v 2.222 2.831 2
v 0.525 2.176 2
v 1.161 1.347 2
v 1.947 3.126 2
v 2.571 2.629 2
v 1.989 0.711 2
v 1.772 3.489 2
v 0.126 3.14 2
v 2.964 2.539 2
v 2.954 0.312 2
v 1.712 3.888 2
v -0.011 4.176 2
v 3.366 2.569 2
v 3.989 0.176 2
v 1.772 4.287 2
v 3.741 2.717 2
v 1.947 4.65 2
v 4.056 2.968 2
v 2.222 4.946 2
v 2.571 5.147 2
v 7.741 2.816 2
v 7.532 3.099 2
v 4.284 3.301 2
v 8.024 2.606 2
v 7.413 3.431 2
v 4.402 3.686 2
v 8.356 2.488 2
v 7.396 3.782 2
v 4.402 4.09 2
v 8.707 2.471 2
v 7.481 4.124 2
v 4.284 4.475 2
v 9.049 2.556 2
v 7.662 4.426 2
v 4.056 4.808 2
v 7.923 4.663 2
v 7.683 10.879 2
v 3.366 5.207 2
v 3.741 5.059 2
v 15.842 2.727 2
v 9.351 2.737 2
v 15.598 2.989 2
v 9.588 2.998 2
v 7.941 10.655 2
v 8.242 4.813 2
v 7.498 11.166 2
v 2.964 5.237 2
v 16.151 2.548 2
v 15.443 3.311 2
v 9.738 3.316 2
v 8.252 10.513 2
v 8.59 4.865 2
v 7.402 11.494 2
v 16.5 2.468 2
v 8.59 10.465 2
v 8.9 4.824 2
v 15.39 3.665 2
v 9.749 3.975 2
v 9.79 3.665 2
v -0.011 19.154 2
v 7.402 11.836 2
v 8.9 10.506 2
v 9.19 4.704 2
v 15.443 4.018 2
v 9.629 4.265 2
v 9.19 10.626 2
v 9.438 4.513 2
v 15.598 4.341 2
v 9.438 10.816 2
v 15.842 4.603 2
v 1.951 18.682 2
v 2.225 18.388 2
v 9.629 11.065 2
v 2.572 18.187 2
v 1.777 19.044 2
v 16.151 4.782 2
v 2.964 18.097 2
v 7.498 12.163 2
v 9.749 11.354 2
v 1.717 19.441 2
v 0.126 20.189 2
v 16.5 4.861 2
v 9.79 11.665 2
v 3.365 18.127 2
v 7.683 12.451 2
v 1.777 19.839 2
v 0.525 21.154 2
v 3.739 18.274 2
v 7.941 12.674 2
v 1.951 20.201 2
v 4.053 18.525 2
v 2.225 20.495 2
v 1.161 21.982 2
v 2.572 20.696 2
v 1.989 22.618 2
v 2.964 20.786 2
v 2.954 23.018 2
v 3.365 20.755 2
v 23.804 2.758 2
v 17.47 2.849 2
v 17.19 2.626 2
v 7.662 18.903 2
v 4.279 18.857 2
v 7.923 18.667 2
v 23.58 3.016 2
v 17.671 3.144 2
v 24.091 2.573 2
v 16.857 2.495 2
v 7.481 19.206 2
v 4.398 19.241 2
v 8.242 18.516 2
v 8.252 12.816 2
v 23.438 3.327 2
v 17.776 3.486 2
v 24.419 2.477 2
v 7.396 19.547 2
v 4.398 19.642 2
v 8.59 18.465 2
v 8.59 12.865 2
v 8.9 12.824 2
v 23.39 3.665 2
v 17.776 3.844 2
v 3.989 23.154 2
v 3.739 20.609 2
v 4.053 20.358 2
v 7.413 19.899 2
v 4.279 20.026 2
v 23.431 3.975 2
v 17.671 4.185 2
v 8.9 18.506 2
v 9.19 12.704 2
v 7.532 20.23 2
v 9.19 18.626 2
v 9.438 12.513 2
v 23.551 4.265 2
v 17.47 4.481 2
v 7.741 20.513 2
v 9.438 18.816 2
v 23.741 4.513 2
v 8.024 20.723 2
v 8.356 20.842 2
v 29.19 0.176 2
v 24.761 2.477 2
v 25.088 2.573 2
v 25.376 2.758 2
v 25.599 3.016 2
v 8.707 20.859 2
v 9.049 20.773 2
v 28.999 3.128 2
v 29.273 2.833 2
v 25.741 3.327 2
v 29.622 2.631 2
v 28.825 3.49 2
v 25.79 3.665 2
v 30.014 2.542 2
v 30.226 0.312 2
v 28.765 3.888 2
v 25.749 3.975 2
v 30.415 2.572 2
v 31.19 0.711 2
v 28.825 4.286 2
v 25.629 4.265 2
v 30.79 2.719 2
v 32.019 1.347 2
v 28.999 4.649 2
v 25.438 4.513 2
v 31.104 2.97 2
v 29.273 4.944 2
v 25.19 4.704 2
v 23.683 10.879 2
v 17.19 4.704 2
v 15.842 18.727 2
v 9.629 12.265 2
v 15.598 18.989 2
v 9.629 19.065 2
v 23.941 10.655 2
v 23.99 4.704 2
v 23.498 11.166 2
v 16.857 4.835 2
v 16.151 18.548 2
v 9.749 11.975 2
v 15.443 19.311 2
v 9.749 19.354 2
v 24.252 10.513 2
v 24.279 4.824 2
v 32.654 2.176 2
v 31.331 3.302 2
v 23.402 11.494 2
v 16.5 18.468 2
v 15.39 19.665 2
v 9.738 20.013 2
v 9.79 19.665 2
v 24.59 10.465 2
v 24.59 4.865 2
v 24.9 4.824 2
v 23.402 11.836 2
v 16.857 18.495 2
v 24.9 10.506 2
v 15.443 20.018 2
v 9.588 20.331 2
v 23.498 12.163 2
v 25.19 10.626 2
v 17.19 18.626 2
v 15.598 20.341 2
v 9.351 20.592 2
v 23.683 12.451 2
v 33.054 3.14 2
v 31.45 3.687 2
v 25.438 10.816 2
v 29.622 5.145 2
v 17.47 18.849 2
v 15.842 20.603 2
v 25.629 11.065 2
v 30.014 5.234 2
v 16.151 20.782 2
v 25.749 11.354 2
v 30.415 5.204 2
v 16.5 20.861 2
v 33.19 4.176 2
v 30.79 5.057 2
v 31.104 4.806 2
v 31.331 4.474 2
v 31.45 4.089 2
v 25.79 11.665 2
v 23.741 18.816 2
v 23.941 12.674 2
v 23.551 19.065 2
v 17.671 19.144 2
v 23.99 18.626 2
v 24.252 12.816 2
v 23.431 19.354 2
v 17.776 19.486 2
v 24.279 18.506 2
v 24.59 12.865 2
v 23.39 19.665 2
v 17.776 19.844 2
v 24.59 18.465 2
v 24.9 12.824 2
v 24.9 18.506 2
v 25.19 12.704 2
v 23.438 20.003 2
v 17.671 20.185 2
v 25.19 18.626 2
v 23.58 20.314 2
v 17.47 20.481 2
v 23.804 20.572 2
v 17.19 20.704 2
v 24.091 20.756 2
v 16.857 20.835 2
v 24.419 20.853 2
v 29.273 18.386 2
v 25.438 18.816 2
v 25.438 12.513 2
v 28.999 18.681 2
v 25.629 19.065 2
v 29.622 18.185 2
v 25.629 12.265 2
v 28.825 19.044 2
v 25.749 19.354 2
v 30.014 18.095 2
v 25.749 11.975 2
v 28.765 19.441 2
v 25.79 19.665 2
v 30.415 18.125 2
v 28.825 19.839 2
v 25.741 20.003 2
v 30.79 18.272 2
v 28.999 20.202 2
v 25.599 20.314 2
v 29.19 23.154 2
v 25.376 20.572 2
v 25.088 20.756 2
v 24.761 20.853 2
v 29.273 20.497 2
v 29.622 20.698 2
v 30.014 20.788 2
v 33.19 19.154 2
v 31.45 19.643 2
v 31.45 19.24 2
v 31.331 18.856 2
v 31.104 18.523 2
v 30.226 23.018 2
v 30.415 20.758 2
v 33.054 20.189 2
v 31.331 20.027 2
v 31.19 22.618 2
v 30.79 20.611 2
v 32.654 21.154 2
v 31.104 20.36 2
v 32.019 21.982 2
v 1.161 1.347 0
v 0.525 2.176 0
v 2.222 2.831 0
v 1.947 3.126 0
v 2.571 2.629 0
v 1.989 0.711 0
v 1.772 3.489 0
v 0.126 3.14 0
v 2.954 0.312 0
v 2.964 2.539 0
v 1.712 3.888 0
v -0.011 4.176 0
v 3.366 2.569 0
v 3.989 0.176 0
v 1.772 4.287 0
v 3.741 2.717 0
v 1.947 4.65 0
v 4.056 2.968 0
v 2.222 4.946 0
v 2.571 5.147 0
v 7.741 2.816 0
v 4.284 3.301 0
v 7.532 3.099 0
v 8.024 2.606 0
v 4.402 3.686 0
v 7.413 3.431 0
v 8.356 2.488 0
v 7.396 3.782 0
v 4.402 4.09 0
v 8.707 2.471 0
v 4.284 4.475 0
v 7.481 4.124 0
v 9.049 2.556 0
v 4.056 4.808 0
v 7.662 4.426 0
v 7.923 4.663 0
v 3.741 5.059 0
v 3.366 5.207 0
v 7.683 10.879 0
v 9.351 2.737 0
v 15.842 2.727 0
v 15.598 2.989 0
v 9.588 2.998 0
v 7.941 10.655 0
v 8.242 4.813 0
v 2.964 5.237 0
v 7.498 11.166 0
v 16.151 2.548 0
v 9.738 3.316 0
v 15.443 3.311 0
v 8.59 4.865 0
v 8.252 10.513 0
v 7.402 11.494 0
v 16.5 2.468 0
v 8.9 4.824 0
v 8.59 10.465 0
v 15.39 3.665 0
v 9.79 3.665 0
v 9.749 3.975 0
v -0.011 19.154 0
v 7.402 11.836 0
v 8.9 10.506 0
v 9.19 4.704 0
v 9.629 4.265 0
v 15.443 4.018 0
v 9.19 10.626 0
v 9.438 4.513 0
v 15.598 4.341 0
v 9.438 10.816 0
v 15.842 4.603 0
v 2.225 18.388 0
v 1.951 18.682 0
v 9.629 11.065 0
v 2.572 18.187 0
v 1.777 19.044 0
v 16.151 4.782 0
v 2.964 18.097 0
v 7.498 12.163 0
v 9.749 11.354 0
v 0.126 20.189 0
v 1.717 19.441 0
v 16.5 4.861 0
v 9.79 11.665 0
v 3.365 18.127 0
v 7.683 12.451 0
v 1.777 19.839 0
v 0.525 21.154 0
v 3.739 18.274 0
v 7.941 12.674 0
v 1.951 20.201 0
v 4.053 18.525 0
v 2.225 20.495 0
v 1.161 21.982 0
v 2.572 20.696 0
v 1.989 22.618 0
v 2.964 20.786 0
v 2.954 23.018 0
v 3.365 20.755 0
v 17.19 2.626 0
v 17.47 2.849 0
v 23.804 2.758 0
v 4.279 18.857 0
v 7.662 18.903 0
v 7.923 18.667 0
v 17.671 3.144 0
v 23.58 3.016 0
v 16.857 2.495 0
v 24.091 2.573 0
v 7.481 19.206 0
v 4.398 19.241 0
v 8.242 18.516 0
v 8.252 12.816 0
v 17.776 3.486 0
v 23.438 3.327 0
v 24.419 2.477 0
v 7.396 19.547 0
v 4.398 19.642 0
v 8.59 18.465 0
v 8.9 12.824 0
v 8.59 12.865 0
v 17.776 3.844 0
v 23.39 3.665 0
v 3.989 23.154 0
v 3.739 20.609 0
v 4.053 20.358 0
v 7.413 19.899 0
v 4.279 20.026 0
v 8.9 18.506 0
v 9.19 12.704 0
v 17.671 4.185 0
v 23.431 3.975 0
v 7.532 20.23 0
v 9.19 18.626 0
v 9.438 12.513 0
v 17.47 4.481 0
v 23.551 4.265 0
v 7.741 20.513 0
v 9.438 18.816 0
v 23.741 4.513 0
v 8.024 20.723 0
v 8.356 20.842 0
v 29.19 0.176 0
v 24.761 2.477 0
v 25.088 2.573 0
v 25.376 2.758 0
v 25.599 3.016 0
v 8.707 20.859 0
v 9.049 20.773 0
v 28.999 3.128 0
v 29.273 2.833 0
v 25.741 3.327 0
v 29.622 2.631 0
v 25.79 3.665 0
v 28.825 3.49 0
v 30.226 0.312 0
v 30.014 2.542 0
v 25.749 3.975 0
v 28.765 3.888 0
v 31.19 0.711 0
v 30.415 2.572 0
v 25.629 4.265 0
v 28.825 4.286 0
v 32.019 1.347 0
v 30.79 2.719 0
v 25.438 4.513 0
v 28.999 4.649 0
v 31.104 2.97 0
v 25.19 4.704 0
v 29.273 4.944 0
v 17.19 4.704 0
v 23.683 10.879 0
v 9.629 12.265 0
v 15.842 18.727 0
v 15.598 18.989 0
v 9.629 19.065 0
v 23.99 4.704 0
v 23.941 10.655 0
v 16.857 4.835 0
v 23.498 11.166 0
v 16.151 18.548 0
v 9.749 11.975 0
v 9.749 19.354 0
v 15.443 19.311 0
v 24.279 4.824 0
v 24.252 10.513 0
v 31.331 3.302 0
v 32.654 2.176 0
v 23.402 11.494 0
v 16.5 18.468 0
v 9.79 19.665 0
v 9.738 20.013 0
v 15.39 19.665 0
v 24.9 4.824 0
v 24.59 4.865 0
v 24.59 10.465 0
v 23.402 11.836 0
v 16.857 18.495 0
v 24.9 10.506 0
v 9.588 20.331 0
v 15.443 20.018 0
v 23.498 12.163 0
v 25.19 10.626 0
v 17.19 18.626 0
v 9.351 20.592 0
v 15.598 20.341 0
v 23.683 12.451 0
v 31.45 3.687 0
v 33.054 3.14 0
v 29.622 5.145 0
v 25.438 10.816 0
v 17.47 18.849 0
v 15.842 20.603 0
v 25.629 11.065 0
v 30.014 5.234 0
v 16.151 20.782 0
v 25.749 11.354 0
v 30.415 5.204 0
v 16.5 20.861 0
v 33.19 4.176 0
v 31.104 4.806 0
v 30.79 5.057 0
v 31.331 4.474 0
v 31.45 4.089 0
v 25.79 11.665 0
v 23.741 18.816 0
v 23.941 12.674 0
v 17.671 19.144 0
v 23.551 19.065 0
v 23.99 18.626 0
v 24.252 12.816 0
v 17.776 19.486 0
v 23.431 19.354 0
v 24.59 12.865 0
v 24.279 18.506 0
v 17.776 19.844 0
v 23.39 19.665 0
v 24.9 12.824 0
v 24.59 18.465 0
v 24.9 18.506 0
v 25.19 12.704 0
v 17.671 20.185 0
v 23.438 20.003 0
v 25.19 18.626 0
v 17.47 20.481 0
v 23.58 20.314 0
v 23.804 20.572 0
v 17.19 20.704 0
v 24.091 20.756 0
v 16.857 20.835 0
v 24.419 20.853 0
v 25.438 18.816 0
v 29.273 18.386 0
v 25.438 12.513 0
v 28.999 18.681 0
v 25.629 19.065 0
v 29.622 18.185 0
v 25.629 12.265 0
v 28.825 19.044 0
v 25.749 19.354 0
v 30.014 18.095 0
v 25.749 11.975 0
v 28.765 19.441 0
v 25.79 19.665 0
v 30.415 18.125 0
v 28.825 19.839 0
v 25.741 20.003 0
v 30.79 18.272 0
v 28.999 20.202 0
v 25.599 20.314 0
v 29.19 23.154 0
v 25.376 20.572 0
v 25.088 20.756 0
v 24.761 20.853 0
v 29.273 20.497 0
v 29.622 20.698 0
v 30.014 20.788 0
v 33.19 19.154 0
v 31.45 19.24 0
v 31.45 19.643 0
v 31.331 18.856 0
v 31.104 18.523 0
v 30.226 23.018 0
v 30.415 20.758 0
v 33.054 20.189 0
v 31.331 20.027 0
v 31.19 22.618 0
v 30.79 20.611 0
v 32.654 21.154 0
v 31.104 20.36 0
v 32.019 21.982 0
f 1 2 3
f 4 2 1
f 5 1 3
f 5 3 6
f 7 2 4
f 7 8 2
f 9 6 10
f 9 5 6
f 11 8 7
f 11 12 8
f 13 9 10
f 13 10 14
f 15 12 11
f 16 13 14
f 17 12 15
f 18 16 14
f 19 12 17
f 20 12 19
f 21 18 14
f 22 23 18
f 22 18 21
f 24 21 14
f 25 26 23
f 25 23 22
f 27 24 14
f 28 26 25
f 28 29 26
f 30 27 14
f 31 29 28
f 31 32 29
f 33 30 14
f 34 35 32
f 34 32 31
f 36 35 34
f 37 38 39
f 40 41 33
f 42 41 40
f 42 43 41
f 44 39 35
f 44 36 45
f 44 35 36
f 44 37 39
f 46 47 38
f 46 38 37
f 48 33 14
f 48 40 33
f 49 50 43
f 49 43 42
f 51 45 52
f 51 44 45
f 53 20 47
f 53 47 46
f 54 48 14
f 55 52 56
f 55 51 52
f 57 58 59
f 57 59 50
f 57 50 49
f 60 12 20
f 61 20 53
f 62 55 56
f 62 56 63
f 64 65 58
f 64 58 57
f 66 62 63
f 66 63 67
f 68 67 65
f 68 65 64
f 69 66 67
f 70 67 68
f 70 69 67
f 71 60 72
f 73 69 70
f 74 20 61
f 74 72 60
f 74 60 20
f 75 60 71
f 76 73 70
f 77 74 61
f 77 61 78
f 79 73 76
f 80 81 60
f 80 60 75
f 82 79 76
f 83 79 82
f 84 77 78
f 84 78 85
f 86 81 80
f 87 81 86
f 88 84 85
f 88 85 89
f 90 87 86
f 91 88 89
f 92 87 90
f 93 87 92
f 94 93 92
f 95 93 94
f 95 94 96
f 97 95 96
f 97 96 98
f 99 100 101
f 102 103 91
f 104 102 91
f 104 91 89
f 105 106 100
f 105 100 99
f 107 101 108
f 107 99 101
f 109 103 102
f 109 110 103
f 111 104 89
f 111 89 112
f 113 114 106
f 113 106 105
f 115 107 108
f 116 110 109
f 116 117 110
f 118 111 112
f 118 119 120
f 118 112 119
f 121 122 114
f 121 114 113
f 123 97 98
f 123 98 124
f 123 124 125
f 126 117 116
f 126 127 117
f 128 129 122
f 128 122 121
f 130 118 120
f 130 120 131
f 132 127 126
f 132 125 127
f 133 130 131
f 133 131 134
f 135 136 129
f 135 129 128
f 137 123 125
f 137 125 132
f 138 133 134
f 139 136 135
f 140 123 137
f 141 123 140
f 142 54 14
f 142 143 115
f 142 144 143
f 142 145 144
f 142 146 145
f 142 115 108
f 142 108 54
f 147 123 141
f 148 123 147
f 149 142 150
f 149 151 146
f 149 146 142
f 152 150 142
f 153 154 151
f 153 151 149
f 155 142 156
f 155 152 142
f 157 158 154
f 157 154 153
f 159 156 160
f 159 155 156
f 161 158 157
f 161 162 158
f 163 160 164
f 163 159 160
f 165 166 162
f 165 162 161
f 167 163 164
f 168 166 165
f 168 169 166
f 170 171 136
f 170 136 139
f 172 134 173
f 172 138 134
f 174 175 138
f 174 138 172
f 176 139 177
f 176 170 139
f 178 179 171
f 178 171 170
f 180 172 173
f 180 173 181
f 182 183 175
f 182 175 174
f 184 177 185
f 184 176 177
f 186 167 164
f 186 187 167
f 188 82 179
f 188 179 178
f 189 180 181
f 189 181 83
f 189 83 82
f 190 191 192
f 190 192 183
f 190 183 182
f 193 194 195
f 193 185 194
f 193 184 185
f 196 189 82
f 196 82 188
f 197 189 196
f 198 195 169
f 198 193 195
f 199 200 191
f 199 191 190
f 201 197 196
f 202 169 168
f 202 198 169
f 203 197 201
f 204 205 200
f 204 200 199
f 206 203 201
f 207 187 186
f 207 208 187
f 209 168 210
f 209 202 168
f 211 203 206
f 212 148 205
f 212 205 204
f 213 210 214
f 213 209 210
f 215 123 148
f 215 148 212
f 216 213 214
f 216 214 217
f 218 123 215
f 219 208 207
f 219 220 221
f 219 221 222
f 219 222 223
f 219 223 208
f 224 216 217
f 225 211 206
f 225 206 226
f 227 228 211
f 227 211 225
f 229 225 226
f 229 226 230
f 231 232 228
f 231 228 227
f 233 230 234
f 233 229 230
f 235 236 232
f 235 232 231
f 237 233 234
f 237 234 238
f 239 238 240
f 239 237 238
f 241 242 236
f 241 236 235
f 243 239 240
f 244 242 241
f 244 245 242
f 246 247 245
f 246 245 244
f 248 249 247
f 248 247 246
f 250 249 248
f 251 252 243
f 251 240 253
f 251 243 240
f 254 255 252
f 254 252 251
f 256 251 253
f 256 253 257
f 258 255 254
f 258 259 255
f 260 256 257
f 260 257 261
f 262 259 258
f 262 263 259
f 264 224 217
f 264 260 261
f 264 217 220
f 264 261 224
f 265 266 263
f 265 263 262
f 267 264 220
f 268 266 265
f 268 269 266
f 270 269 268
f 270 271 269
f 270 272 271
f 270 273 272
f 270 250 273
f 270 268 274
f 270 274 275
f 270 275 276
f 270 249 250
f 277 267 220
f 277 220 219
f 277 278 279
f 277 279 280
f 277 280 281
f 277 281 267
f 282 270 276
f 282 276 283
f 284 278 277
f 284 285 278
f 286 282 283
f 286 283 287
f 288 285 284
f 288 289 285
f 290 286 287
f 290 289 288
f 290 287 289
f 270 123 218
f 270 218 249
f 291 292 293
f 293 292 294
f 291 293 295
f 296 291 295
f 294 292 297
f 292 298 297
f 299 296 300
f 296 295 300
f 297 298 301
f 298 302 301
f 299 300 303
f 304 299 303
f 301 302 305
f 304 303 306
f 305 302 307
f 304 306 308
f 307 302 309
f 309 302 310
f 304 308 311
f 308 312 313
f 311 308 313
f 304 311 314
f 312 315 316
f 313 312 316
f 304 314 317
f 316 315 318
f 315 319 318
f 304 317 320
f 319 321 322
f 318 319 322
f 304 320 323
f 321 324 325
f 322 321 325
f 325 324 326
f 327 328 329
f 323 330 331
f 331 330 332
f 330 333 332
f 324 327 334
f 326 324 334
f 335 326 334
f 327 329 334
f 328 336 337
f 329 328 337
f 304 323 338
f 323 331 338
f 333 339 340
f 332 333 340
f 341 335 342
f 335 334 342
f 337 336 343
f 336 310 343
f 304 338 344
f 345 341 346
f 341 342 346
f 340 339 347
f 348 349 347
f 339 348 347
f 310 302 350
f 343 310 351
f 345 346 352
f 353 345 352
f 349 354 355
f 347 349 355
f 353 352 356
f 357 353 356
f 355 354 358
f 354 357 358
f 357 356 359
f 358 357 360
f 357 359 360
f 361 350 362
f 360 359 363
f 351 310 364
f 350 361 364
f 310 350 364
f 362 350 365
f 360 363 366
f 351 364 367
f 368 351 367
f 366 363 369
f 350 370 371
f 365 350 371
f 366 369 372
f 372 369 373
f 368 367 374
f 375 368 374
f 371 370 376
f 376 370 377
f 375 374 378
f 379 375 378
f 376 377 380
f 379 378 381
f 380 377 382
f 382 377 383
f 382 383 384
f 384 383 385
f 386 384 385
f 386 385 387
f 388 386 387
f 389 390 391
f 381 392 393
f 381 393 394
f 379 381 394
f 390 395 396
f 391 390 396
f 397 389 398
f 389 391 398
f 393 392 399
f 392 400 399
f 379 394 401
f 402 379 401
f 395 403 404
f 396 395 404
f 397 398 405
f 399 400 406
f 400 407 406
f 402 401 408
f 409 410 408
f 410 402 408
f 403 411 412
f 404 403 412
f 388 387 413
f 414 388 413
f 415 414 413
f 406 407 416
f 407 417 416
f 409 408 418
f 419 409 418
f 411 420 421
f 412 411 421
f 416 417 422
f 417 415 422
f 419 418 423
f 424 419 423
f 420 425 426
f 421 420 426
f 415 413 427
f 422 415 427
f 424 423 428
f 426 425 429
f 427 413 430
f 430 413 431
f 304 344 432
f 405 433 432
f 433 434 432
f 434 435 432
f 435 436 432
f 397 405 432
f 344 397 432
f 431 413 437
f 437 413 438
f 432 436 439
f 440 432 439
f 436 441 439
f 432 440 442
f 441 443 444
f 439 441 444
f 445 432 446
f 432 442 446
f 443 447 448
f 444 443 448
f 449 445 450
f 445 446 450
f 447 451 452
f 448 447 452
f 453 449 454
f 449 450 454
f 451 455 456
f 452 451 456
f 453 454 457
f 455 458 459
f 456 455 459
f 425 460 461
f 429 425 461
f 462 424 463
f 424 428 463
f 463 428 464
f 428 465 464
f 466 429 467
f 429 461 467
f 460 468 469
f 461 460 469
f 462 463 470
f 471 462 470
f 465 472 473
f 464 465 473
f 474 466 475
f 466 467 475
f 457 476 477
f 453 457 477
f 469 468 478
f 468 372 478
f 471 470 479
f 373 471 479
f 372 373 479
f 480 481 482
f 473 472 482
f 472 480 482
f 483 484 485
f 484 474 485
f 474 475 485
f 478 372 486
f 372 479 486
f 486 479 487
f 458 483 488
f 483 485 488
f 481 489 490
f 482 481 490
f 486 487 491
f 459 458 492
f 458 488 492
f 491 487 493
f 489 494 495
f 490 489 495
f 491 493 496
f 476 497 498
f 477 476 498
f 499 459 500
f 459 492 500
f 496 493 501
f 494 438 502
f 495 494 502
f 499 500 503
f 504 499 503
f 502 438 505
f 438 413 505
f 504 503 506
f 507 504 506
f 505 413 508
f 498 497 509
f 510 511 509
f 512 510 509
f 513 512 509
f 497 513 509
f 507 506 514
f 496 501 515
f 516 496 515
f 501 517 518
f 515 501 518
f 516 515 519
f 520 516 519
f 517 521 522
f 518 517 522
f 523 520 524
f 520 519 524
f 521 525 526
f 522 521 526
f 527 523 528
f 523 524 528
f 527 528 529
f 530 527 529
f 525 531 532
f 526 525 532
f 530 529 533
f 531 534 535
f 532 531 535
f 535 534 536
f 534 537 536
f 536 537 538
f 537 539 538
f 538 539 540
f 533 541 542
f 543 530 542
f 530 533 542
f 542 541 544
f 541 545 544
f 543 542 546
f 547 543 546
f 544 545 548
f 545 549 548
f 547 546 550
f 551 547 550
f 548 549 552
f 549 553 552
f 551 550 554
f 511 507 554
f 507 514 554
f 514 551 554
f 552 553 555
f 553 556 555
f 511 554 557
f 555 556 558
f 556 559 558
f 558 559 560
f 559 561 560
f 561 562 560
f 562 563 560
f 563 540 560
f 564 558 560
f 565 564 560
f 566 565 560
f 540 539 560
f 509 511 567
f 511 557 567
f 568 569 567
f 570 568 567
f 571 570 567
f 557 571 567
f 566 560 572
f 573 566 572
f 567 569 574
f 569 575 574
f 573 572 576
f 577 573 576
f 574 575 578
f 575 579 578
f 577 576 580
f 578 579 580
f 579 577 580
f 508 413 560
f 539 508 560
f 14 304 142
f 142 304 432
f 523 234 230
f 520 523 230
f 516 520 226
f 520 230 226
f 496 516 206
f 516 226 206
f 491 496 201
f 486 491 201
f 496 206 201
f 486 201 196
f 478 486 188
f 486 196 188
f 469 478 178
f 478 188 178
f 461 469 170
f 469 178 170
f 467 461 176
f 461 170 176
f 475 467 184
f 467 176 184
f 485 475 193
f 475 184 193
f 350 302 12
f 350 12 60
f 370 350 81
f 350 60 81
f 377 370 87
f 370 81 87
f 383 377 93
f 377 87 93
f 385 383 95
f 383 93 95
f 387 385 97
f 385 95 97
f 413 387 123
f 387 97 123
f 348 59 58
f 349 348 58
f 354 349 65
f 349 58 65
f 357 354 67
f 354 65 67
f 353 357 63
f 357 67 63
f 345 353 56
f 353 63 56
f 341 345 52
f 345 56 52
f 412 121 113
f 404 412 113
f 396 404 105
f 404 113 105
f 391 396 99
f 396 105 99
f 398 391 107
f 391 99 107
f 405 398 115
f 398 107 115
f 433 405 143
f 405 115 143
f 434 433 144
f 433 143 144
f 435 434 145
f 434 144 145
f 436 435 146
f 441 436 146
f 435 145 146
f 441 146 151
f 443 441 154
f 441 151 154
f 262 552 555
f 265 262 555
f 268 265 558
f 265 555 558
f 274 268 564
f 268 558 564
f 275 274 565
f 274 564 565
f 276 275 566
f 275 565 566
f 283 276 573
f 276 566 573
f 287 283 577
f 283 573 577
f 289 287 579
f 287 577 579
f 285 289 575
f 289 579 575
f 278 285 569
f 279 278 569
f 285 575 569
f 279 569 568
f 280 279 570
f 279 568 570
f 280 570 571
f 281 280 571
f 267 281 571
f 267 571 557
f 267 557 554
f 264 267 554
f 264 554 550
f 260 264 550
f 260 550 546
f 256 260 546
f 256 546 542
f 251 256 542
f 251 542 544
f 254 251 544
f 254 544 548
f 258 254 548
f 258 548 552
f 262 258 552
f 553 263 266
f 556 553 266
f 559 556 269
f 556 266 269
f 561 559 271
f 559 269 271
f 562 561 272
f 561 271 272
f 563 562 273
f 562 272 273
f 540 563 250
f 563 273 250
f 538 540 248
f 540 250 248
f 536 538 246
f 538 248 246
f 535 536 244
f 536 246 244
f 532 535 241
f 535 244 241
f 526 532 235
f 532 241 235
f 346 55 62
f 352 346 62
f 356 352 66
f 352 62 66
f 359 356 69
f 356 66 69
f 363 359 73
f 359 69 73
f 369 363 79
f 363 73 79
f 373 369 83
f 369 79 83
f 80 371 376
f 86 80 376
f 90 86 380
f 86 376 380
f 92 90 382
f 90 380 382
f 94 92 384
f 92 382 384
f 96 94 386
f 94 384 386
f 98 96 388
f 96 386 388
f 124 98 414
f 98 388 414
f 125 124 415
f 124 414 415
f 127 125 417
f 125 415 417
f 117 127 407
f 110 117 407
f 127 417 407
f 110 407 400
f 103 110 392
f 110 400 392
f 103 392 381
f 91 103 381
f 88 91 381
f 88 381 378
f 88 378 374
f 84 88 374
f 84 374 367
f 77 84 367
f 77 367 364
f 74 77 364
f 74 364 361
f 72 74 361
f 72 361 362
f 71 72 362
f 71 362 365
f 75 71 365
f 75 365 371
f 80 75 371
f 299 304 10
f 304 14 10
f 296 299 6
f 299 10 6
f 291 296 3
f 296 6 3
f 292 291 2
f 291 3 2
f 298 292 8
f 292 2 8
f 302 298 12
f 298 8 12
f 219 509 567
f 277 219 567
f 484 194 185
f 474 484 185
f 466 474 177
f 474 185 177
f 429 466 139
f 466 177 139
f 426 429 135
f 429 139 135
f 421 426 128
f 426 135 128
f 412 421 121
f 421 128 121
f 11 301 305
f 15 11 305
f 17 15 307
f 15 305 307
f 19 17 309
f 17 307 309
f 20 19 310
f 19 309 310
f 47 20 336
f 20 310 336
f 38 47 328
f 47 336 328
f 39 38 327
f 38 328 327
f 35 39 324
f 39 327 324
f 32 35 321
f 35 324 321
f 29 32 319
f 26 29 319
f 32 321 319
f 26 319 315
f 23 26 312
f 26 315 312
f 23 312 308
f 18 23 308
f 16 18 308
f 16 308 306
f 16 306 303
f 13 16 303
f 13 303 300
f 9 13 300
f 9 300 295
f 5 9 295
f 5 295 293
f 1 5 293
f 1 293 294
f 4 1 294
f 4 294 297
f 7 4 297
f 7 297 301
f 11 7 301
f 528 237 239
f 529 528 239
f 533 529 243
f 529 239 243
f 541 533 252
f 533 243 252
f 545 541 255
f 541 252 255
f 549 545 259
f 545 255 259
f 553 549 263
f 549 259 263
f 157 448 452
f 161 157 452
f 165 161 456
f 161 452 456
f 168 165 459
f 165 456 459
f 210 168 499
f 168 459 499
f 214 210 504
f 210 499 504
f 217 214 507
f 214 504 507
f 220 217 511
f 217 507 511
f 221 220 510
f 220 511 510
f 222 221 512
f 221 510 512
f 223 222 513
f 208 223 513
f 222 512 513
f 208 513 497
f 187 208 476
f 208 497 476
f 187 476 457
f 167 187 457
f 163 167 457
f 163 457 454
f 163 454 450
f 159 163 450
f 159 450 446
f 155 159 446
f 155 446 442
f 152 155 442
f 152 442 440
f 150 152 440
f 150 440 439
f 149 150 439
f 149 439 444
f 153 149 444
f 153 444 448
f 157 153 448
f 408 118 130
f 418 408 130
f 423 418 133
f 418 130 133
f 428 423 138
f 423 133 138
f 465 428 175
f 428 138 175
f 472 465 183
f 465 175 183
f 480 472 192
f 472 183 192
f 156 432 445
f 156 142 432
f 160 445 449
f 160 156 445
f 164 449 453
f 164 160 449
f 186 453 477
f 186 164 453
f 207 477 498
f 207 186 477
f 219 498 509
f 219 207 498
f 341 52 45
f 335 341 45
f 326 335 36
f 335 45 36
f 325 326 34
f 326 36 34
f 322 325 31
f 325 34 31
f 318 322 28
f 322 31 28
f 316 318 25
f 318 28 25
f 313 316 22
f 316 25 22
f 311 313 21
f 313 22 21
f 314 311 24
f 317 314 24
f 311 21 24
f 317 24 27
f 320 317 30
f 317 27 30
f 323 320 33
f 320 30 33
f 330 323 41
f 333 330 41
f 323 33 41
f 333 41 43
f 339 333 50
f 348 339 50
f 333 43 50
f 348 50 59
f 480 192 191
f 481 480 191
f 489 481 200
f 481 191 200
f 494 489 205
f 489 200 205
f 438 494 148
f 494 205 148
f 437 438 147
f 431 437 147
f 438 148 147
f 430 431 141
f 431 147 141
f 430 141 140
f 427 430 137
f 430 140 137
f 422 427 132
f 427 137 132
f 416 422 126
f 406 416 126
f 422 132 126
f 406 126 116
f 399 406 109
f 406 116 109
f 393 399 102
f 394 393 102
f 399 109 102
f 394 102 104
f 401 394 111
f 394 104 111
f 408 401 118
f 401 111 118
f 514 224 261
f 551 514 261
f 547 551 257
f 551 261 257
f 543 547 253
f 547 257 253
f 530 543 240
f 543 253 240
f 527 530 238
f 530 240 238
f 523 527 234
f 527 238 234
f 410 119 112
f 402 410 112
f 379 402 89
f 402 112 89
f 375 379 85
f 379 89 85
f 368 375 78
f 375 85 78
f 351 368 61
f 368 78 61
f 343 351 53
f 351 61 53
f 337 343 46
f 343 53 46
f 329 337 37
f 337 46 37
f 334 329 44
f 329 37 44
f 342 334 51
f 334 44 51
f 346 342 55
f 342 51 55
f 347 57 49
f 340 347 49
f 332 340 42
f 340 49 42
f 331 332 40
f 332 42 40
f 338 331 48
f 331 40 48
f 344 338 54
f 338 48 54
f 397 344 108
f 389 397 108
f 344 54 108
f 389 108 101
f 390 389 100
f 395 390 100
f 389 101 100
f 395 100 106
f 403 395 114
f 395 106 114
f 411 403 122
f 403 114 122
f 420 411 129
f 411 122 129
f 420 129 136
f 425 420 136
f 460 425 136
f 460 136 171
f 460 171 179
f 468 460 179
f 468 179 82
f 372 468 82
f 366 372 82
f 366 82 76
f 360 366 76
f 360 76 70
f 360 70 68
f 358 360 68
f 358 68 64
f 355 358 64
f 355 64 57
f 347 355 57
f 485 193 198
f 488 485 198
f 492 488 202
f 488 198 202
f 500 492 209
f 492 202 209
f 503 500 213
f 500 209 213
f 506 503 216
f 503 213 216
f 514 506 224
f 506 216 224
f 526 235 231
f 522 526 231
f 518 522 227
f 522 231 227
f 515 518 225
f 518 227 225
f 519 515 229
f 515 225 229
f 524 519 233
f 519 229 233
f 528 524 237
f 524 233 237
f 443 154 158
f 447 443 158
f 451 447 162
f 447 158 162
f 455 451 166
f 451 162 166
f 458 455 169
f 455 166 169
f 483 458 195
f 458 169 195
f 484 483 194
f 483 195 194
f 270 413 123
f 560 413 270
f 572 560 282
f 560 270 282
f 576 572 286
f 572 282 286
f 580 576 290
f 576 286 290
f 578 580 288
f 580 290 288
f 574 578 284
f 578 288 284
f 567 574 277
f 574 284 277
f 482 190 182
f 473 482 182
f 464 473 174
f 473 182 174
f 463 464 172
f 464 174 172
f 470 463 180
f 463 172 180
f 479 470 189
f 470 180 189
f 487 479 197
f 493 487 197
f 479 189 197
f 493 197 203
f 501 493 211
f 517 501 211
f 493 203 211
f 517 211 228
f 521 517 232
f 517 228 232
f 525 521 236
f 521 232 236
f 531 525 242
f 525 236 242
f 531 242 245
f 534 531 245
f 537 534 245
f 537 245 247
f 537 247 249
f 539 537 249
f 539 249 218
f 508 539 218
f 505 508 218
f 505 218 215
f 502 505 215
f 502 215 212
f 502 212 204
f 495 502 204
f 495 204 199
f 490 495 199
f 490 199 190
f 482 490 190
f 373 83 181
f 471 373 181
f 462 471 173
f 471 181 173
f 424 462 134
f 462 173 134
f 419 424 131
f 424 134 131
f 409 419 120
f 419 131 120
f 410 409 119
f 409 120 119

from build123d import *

# Parameters (mm, degrees)
CROQUIS1_W              = 33.201006025
CROQUIS1_H              = 22.978323476
SALIENTE_EXTRUIR1_DEPTH = 2
CROQUIS3_R              = 1.35
CROQUIS3_R_2            = 1.347868192
CROQUIS3_R_3            = 1.352554563
CORTAR_EXTRUIR2_DEPTH   = 41.51793761
REDONDEO2_R             = 4
REDONDEO3_R             = 4
CORTAR_EXTRUIR3_DEPTH   = 41.51793761


with BuildPart() as part:
    # Croquis1 → Saliente-Extruir1 (new body)
    with BuildSketch(Plane.XY):
        with Locations((16.58985656, 11.664742893)):
            Rectangle(CROQUIS1_W, CROQUIS1_H)
    extrude(amount=SALIENTE_EXTRUIR1_DEPTH)

    # Croquis3 → Cortar-Extruir2 (cut, through all)
    with BuildSketch(Plane(origin=(0, 0, 0), x_dir=(-1, 0, 0), z_dir=(0, 0, -1))):
        with Locations((-30.114791782, 19.441420757)):
            Circle(CROQUIS3_R)
        with Locations((-3.064921335, 19.441420756)):
            Circle(CROQUIS3_R_2)
        with Locations((-3.064921337, 3.888065031)):
            Circle(CROQUIS3_R_3)
        with Locations((-30.114791782, 3.888065031)):
            Circle(CROQUIS3_R)
    extrude(amount=-CORTAR_EXTRUIR2_DEPTH, mode=Mode.SUBTRACT)

    # Redondeo2
    redondeo2_edges = [part.edges().sort_by_distance(p)[0] for p in [
        (33.190359572, 23.153904631, 1),
        (33.190359572, 0.175581155, 1),
    ]]
    fillet(redondeo2_edges, radius=REDONDEO2_R)

    # Redondeo3
    redondeo3_edges = [part.edges().sort_by_distance(p)[0] for p in [
        (-0.010646453, 23.153904631, 1),
        (-0.010646453, 0.175581155, 1),
    ]]
    fillet(redondeo3_edges, radius=REDONDEO3_R)

    # Croquis4 → Cortar-Extruir3 (cut, through all)
    with BuildSketch(Plane.XY.offset(2)):
        with BuildLine():
            Line((8.589856559, 18.464742893), (8.589856559, 19.664742893))
            Line((8.589856559, 19.664742893), (9.789856559, 19.664742893))
            ThreePointArc((9.789856559, 19.664742893), (7.741328422, 20.513271031), (8.589856559, 18.464742893))
        make_face()
        with BuildLine():
            Line((9.789856559, 19.664742893), (8.589856559, 19.664742893))
            Line((8.589856559, 19.664742893), (8.589856559, 18.464742893))
            ThreePointArc((8.589856559, 18.464742893), (9.438384697, 18.816214756), (9.789856559, 19.664742893))
        make_face()
        with BuildLine():
            ThreePointArc((9.789856559, 11.664742893), (9.438384697, 12.513271031), (8.589856559, 12.864742893))
            Line((8.589856559, 12.864742893), (8.589856559, 10.464742893))
            ThreePointArc((8.589856559, 10.464742893), (9.438384697, 10.816214756), (9.789856559, 11.664742893))
        make_face()
        with BuildLine():
            Line((8.589856559, 10.464742893), (8.589856559, 12.864742893))
            ThreePointArc((8.589856559, 12.864742893), (7.389856559, 11.664742893), (8.589856559, 10.464742893))
        make_face()
        with BuildLine():
            ThreePointArc((9.789856559, 3.664742893), (9.438384697, 4.513271031), (8.589856559, 4.864742893))
            Line((8.589856559, 4.864742893), (8.589856559, 3.664742893))
            Line((8.589856559, 3.664742893), (9.789856559, 3.664742893))
        make_face()
        with BuildLine():
            Line((8.589856559, 3.664742893), (8.589856559, 4.864742893))
            ThreePointArc((8.589856559, 4.864742893), (7.741328422, 2.816214756), (9.789856559, 3.664742893))
            Line((9.789856559, 3.664742893), (8.589856559, 3.664742893))
        make_face()
        with BuildLine():
            ThreePointArc((17.789856559, 3.664742893), (16.589856559, 4.864742893), (15.389856559, 3.664742893))
            Line((15.389856559, 3.664742893), (17.789856559, 3.664742893))
        make_face()
        with BuildLine():
            Line((17.789856559, 3.664742893), (15.389856559, 3.664742893))
            ThreePointArc((15.389856559, 3.664742893), (16.589856559, 2.464742893), (17.789856559, 3.664742893))
        make_face()
        with BuildLine():
            ThreePointArc((25.789856559, 3.664742893), (25.438384697, 4.513271031), (24.589856559, 4.864742893))
            Line((24.589856559, 4.864742893), (24.589856559, 3.664742893))
            Line((24.589856559, 3.664742893), (23.389856559, 3.664742893))
            ThreePointArc((23.389856559, 3.664742893), (24.589856559, 2.464742893), (25.789856559, 3.664742893))
        make_face()
        with BuildLine():
            Line((24.589856559, 3.664742893), (24.589856559, 4.864742893))
            ThreePointArc((24.589856559, 4.864742893), (23.741328422, 4.513271031), (23.389856559, 3.664742893))
            Line((23.389856559, 3.664742893), (24.589856559, 3.664742893))
        make_face()
        with BuildLine():
            ThreePointArc((25.789856559, 11.664742893), (25.438384697, 12.513271031), (24.589856559, 12.864742893))
            Line((24.589856559, 12.864742893), (24.589856559, 10.464742893))
            ThreePointArc((24.589856559, 10.464742893), (25.438384697, 10.816214756), (25.789856559, 11.664742893))
        make_face()
        with BuildLine():
            Line((24.589856559, 10.464742893), (24.589856559, 12.864742893))
            ThreePointArc((24.589856559, 12.864742893), (23.389856559, 11.664742893), (24.589856559, 10.464742893))
        make_face()
        with BuildLine():
            ThreePointArc((25.789856559, 19.664742893), (24.589856559, 20.864742893), (23.389856559, 19.664742893))
            Line((23.389856559, 19.664742893), (24.589856559, 19.664742893))
            Line((24.589856559, 19.664742893), (24.589856559, 18.464742893))
            ThreePointArc((24.589856559, 18.464742893), (25.438384697, 18.816214756), (25.789856559, 19.664742893))
        make_face()
        with BuildLine():
            Line((24.589856559, 19.664742893), (23.389856559, 19.664742893))
            ThreePointArc((23.389856559, 19.664742893), (23.741328422, 18.816214756), (24.589856559, 18.464742893))
            Line((24.589856559, 18.464742893), (24.589856559, 19.664742893))
        make_face()
        with BuildLine():
            ThreePointArc((17.789856559, 19.664742893), (16.589856559, 20.864742893), (15.389856559, 19.664742893))
            Line((15.389856559, 19.664742893), (17.789856559, 19.664742893))
        make_face()
        with BuildLine():
            Line((17.789856559, 19.664742893), (15.389856559, 19.664742893))
            ThreePointArc((15.389856559, 19.664742893), (16.589856559, 18.464742893), (17.789856559, 19.664742893))
        make_face()
    extrude(amount=-CORTAR_EXTRUIR3_DEPTH, mode=Mode.SUBTRACT)


solid = part.part
